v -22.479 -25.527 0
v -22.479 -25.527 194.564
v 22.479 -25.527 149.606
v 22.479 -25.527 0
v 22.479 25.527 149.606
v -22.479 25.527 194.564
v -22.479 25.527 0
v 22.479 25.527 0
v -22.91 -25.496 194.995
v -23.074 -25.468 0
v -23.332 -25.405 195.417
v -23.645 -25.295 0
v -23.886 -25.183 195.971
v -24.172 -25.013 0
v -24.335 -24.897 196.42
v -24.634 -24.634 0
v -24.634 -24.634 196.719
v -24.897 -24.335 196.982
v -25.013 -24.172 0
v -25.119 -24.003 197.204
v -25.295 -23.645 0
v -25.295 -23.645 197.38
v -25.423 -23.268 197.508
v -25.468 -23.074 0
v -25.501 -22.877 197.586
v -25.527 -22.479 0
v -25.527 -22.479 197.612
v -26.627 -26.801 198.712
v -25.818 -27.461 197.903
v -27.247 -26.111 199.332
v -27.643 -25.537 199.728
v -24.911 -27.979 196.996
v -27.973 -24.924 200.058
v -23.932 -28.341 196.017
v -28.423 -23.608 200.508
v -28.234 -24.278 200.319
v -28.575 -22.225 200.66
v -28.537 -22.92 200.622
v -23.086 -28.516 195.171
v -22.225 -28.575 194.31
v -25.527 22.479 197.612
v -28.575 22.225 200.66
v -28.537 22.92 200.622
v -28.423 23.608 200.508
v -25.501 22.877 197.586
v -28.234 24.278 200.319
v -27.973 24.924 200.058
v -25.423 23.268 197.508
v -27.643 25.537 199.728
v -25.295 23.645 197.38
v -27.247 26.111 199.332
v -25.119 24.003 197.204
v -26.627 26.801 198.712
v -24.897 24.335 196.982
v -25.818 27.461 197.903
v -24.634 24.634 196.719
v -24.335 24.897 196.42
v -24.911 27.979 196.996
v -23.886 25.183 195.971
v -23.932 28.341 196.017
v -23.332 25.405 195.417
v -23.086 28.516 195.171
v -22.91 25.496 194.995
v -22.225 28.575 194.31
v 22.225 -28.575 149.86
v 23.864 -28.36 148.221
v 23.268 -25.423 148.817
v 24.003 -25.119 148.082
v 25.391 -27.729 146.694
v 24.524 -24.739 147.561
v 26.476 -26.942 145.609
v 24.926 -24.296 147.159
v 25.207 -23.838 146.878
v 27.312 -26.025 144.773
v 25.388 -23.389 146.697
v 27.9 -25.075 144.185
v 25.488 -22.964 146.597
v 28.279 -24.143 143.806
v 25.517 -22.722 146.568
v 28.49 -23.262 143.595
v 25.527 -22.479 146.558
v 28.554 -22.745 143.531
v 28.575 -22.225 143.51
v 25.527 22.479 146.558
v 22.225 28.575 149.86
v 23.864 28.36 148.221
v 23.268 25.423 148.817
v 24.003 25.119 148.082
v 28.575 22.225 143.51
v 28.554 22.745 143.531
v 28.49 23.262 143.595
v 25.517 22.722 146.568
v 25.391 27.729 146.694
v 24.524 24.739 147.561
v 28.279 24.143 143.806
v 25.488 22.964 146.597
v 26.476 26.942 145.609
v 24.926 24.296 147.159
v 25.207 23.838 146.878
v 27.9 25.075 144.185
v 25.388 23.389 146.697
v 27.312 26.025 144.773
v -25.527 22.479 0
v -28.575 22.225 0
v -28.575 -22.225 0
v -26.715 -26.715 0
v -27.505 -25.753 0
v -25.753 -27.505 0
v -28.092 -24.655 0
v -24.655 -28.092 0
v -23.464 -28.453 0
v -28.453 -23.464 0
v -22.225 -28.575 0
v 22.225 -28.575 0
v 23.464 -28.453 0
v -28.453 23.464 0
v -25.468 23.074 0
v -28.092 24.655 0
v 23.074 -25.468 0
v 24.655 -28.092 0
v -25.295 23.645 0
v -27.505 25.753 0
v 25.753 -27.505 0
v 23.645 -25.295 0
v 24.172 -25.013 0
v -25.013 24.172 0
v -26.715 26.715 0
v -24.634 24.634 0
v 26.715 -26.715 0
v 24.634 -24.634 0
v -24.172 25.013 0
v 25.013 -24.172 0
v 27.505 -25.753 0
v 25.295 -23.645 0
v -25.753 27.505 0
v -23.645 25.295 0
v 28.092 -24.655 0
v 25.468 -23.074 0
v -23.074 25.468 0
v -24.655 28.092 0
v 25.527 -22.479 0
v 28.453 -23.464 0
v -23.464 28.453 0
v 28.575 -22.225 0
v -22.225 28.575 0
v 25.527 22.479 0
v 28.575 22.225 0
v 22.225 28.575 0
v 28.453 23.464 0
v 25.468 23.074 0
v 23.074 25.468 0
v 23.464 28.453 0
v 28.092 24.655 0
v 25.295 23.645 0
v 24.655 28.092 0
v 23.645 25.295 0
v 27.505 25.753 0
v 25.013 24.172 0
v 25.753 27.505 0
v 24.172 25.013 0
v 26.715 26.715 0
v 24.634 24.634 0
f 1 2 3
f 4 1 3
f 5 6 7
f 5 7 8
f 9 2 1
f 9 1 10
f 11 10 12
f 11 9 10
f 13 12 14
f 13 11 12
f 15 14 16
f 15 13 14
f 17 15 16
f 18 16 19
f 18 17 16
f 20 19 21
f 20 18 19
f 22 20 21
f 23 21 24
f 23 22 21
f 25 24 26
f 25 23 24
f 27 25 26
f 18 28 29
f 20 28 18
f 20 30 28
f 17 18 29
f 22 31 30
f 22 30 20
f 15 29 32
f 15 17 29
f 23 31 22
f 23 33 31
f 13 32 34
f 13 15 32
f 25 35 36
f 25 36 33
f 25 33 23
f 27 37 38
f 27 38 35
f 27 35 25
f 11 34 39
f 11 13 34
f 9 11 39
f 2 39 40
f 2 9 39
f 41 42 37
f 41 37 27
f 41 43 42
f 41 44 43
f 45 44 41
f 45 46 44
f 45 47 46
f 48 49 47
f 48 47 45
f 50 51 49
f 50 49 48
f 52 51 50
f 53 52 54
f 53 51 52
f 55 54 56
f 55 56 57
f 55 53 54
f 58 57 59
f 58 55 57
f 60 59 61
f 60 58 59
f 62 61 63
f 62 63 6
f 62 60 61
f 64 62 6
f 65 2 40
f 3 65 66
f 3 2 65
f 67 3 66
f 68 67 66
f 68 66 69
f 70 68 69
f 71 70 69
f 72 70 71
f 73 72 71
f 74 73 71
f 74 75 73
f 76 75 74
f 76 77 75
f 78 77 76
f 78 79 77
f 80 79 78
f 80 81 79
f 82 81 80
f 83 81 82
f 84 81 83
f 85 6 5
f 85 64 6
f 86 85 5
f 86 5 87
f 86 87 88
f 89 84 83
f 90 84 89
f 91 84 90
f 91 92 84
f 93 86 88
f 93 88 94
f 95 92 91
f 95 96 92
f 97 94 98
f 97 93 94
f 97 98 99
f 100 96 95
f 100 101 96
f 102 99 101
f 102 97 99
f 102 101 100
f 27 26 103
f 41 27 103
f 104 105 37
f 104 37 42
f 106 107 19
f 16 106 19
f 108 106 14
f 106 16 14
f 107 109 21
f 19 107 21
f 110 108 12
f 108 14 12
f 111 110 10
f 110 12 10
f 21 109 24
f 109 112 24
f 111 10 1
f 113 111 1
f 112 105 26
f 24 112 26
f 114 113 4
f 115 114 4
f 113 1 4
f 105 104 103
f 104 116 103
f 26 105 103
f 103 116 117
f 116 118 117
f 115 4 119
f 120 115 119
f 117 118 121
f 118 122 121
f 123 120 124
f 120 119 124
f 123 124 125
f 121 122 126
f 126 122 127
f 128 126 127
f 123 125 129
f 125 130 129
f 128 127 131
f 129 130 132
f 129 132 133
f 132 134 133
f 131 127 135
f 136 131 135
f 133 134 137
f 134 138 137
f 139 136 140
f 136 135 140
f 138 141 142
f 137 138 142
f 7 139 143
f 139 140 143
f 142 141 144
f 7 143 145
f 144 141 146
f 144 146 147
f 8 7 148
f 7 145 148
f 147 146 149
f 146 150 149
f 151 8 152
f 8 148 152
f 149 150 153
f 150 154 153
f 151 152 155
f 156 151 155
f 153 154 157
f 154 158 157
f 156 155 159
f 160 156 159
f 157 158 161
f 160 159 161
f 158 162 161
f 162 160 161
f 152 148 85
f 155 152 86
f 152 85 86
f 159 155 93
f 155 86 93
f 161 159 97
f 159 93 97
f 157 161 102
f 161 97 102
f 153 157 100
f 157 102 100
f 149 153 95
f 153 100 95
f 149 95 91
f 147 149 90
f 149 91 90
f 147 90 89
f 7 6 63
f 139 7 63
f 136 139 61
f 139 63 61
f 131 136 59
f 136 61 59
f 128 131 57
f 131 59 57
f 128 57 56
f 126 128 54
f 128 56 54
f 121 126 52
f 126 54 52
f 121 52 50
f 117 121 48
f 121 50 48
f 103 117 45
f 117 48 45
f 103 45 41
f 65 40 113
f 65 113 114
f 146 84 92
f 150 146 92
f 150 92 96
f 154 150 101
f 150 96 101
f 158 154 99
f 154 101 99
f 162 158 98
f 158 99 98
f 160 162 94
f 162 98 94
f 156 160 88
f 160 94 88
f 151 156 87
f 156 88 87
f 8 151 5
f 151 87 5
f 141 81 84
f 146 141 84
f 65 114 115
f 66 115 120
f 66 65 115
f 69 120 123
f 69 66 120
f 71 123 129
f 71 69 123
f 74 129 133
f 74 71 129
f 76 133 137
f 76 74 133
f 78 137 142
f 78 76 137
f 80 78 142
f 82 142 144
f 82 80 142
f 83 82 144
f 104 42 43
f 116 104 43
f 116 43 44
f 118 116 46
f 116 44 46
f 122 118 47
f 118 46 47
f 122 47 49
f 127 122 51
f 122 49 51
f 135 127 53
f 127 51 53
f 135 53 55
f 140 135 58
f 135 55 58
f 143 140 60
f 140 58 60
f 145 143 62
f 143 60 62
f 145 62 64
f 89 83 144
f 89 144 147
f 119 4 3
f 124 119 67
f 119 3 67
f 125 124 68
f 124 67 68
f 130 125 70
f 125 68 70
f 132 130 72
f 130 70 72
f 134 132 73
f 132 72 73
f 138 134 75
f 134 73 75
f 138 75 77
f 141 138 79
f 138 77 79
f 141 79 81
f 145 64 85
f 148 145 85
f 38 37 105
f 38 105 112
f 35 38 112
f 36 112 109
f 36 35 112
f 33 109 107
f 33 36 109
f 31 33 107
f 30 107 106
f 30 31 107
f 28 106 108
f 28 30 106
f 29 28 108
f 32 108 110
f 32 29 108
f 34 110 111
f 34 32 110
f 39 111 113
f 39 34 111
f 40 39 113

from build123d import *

# Parameters (mm, degrees)
F0_W          = 57.15
F0_H          = 57.15
F0_W_2        = 51.054
F0_H_2        = 51.054
F1_DEPTH      = 200.66
F2_R          = 3.048
F3_R          = 6.35
F5_DEPTH      = 28.576
F5_DEPTH_BACK = 28.576


with BuildPart() as f1:
    # F0 (on Top) → F1 (new body)
    with BuildSketch(Plane.XY):
        Rectangle(F0_W, F0_H)
        Rectangle(F0_W_2, F0_H_2, mode=Mode.SUBTRACT)
    extrude(amount=F1_DEPTH)

    # F2
    f2_edges = [f1.edges().sort_by_distance(p)[0] for p in [
        (25.527, 25.527, 100.33),
        (-25.527, 25.527, 100.33),
        (-25.527, -25.527, 100.33),
        (25.527, -25.527, 100.33),
    ]]
    fillet(f2_edges, radius=F2_R)

    # F3
    f3_edges = [f1.edges().sort_by_distance(p)[0] for p in [
        (-28.575, 28.575, 100.33),
        (-28.575, -28.575, 100.33),
        (28.575, -28.575, 100.33),
        (28.575, 28.575, 100.33),
    ]]
    fillet(f3_edges, radius=F3_R)

    # F4 (on Front) → F5 (cut, two sides)
    with BuildSketch(Plane.XZ) as f5_sk:
        Polygon((-28.575, 200.66), (28.575, 143.51), (28.575, 200.66), align=None)
    extrude(amount=-F5_DEPTH, mode=Mode.SUBTRACT)
    extrude(f5_sk.sketch, amount=F5_DEPTH_BACK, mode=Mode.SUBTRACT)


solid = f1.part
